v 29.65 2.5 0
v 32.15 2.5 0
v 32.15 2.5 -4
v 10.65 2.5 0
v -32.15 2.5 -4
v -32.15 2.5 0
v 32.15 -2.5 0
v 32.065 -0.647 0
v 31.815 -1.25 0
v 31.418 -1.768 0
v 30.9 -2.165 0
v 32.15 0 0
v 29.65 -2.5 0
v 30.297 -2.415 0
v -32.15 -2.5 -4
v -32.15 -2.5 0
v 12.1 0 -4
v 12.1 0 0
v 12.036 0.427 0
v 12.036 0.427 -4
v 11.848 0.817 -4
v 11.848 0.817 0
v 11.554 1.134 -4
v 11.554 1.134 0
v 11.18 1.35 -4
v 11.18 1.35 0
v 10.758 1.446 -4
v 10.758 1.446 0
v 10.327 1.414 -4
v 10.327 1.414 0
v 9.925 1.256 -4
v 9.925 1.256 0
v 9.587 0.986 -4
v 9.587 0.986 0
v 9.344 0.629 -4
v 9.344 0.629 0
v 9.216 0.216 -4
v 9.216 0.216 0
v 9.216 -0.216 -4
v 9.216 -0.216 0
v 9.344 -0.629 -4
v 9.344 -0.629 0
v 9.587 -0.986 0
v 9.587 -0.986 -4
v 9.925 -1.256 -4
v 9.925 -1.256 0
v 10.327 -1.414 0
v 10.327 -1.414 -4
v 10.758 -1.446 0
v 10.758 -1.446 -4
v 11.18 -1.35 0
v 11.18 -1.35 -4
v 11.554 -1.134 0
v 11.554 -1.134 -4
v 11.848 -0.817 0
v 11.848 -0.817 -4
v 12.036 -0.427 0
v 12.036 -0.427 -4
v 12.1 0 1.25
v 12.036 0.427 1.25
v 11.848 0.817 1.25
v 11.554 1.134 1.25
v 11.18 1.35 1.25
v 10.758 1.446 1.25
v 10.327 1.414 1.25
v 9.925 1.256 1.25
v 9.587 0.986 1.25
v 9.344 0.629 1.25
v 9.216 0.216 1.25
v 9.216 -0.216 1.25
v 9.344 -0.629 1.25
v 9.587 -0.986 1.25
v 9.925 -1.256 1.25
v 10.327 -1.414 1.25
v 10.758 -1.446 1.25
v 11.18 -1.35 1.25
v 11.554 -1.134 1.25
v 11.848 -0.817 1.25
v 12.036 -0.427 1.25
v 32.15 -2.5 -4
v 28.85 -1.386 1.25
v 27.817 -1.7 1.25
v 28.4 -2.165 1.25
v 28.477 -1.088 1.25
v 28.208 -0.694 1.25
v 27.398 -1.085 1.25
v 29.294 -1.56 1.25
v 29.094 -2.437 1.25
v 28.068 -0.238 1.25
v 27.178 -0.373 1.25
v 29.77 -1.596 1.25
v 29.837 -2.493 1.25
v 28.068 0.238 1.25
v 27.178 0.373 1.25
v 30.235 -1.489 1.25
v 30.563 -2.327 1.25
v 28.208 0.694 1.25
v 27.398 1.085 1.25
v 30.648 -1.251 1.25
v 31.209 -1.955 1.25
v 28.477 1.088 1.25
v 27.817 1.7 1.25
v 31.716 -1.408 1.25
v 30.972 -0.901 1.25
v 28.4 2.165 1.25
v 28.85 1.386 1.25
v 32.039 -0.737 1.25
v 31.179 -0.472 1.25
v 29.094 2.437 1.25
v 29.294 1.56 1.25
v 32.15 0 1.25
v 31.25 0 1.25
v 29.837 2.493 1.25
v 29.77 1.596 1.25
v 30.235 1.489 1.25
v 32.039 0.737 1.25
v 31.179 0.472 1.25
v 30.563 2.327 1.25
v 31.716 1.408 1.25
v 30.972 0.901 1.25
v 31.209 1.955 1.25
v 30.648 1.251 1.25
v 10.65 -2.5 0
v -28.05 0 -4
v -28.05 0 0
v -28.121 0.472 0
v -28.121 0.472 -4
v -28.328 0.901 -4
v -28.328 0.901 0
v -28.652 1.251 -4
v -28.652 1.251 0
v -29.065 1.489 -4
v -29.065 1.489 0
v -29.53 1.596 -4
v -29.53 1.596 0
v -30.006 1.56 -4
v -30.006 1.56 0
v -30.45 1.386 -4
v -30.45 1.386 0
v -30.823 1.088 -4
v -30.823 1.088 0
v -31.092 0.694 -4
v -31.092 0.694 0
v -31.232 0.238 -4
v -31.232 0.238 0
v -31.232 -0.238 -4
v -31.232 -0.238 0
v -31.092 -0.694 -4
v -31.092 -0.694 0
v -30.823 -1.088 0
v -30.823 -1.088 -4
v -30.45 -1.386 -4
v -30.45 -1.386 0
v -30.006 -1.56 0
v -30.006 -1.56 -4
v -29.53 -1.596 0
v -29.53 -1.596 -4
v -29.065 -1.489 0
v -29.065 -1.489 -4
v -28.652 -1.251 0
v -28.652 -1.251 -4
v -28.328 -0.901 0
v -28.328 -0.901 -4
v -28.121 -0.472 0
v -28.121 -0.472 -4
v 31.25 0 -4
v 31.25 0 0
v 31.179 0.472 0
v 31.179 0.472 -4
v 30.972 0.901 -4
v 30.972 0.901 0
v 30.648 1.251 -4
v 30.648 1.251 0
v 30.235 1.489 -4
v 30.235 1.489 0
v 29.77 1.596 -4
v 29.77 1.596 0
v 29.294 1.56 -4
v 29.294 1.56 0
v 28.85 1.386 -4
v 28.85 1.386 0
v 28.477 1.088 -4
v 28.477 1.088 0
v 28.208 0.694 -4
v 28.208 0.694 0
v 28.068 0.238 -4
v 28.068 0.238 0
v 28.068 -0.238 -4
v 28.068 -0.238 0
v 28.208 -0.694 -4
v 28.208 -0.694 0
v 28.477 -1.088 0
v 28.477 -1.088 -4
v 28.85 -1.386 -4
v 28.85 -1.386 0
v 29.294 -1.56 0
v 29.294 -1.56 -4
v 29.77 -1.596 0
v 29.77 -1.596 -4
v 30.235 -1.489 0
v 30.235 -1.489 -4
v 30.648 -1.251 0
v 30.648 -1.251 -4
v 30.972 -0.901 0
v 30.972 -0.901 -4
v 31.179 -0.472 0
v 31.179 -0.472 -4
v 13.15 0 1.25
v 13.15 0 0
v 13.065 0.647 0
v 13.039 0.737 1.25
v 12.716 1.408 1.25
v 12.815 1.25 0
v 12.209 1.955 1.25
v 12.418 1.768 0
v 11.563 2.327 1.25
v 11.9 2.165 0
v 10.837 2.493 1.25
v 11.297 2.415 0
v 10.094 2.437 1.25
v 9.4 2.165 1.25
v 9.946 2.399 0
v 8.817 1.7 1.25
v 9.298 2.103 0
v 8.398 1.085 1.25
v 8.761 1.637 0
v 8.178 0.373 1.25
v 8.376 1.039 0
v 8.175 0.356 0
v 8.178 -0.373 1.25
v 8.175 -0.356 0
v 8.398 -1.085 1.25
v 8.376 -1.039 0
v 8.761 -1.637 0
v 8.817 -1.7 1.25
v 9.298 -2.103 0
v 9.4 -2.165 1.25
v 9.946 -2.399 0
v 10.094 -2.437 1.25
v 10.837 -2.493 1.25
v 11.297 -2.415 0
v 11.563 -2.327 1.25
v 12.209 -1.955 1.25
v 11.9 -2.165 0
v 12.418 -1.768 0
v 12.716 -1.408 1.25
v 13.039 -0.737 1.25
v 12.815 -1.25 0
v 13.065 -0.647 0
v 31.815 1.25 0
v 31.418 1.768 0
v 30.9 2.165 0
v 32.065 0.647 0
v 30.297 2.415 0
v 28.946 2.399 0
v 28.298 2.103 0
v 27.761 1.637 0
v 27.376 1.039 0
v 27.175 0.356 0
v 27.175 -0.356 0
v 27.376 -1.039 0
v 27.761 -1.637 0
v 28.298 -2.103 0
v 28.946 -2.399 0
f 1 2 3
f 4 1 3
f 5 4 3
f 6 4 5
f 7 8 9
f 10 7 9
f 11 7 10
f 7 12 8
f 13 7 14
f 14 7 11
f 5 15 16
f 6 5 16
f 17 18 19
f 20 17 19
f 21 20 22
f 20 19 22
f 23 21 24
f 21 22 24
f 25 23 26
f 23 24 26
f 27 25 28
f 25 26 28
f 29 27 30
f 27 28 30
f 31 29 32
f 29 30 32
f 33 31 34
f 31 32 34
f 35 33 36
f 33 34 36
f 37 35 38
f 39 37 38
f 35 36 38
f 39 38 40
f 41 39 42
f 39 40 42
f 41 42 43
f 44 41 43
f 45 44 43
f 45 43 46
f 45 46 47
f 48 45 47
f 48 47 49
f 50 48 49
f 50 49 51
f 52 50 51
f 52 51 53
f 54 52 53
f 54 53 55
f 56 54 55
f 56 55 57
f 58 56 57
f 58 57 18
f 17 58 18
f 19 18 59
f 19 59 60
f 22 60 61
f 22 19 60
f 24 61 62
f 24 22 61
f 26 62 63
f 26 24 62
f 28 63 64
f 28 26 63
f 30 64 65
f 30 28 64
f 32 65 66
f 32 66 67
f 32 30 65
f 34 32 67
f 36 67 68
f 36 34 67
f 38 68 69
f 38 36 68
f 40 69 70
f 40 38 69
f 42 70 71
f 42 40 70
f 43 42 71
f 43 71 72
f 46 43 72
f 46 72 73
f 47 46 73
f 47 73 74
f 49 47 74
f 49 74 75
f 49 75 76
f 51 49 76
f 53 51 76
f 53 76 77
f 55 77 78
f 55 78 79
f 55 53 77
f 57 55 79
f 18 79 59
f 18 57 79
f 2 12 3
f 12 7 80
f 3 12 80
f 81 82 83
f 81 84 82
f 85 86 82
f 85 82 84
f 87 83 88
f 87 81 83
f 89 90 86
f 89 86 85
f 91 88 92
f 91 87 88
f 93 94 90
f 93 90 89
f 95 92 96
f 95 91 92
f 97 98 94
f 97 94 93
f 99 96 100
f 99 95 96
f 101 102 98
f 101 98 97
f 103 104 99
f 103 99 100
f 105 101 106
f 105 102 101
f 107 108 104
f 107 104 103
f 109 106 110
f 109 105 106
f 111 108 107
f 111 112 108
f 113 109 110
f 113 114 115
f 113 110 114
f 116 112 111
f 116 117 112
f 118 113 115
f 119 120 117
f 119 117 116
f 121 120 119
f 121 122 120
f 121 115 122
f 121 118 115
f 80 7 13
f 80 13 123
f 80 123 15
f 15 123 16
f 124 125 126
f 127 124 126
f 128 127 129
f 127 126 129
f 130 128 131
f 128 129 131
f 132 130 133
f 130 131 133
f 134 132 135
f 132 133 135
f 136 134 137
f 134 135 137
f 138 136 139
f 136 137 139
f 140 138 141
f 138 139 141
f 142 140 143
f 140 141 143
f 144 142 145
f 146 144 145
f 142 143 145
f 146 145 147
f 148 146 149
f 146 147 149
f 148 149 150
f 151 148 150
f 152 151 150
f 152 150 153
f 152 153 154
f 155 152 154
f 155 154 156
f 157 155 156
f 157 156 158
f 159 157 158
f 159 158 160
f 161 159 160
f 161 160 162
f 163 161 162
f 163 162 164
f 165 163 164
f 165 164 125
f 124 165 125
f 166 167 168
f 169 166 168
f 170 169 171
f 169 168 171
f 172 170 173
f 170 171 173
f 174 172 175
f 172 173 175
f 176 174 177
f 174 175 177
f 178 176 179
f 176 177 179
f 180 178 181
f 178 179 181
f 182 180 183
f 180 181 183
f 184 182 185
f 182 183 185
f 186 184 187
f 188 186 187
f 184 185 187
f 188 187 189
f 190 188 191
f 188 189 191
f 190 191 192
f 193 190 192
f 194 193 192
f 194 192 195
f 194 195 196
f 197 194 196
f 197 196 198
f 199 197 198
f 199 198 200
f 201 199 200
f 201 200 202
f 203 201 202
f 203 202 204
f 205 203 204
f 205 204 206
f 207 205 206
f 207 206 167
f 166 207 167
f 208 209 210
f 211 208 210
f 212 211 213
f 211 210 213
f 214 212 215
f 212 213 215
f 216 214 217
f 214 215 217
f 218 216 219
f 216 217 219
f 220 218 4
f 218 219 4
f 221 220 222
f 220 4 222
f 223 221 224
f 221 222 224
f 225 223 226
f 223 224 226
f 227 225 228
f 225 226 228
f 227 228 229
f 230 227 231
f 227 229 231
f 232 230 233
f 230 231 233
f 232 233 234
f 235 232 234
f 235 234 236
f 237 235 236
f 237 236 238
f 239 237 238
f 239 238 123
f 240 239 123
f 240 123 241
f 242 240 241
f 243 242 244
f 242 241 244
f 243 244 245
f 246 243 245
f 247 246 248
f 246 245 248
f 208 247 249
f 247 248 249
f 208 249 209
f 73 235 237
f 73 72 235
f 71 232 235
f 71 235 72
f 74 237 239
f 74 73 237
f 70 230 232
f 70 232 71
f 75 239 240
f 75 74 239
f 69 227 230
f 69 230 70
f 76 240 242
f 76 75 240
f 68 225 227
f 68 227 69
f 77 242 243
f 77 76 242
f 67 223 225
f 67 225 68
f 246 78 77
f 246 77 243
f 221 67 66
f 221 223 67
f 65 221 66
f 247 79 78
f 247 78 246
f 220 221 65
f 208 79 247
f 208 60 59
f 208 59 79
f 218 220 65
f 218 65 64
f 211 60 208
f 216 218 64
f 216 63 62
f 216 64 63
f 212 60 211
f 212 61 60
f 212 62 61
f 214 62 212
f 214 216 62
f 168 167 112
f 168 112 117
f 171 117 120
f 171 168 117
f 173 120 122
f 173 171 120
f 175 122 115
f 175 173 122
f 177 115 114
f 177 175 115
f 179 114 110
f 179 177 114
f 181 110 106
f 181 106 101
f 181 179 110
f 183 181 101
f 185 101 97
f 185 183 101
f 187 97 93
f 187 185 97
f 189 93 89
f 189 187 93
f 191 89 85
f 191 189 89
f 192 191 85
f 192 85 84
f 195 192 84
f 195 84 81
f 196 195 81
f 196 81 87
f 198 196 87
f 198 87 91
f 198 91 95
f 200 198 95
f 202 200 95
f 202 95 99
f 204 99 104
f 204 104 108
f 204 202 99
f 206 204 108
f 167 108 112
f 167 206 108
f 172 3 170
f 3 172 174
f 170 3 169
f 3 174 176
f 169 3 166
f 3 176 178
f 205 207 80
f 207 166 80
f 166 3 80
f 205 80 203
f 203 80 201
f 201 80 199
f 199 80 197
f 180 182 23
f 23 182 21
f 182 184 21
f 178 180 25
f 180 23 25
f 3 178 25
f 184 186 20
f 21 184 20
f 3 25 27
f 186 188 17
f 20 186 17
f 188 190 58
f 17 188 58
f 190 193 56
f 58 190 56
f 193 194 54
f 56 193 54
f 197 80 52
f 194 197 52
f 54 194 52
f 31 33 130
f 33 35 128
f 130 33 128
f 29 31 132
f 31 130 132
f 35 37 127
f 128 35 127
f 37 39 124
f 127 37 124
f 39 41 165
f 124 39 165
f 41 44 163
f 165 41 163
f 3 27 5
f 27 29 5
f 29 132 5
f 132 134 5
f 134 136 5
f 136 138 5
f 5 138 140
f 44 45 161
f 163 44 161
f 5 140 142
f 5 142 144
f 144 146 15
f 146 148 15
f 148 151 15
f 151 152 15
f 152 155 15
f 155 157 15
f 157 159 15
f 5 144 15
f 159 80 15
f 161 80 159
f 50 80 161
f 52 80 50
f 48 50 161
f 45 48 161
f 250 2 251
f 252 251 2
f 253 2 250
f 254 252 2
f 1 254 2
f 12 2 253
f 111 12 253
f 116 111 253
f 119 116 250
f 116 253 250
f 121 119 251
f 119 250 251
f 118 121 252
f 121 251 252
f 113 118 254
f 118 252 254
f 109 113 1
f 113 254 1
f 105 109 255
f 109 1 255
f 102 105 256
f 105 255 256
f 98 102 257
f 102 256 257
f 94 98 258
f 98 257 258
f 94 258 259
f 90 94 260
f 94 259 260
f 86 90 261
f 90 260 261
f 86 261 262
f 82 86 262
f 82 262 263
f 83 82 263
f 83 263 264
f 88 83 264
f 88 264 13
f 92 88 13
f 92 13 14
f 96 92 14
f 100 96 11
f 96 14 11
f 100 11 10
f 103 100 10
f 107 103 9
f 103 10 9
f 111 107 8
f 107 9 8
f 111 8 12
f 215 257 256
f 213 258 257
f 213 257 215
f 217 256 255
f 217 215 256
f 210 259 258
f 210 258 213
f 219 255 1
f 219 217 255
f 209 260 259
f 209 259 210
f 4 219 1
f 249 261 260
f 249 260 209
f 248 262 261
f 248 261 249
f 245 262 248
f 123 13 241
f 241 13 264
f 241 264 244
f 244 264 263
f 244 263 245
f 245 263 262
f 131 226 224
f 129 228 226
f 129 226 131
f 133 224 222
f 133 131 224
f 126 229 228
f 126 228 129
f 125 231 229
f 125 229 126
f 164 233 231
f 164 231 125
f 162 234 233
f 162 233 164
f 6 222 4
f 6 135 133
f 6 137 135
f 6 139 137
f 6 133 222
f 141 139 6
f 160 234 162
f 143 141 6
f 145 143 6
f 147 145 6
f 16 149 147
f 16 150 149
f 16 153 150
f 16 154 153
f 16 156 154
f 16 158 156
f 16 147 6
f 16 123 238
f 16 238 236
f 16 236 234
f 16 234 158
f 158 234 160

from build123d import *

# Parameters (mm, degrees)
PAD_DEPTH       = 2.5
SKETCH002_R     = 1.6
SKETCH002_R_2   = 1.45
POCKET001_DEPTH = 4.001
SKETCH003_R     = 2.5
SKETCH003_R_2   = 1.45
SKETCH003_R_3   = 1.6
PAD001_DEPTH    = 1.25


with BuildPart() as part:
    # Sketch → Pad (new body, symmetric)
    with BuildSketch(Plane.XZ):
        Polygon((-27.15, 0), (27.15, 0), (32.15, 0), (32.15, -4), (-32.15, -4), (-32.15, 0), align=None)
    extrude(amount=PAD_DEPTH, both=True)

    # Sketch002 → Pocket001 (cut, through all)
    with BuildSketch(Plane.XY):
        with Locations((29.65, 0)):
            Circle(SKETCH002_R)
        with Locations((10.65, 0)):
            Circle(SKETCH002_R_2)
        with Locations((-29.65, 0)):
            Circle(SKETCH002_R)
    extrude(amount=-POCKET001_DEPTH, mode=Mode.SUBTRACT)

    # Sketch003 → Pad001 (join)
    with BuildSketch(Plane.XY):
        with Locations((10.65, 0)):
            Circle(SKETCH003_R)
        with Locations((10.65, 0)):
            Circle(SKETCH003_R_2, mode=Mode.SUBTRACT)
        with Locations((29.65, 0)):
            Circle(SKETCH003_R)
        with Locations((29.65, 0)):
            Circle(SKETCH003_R_3, mode=Mode.SUBTRACT)
    extrude(amount=PAD001_DEPTH)


solid = part.part
